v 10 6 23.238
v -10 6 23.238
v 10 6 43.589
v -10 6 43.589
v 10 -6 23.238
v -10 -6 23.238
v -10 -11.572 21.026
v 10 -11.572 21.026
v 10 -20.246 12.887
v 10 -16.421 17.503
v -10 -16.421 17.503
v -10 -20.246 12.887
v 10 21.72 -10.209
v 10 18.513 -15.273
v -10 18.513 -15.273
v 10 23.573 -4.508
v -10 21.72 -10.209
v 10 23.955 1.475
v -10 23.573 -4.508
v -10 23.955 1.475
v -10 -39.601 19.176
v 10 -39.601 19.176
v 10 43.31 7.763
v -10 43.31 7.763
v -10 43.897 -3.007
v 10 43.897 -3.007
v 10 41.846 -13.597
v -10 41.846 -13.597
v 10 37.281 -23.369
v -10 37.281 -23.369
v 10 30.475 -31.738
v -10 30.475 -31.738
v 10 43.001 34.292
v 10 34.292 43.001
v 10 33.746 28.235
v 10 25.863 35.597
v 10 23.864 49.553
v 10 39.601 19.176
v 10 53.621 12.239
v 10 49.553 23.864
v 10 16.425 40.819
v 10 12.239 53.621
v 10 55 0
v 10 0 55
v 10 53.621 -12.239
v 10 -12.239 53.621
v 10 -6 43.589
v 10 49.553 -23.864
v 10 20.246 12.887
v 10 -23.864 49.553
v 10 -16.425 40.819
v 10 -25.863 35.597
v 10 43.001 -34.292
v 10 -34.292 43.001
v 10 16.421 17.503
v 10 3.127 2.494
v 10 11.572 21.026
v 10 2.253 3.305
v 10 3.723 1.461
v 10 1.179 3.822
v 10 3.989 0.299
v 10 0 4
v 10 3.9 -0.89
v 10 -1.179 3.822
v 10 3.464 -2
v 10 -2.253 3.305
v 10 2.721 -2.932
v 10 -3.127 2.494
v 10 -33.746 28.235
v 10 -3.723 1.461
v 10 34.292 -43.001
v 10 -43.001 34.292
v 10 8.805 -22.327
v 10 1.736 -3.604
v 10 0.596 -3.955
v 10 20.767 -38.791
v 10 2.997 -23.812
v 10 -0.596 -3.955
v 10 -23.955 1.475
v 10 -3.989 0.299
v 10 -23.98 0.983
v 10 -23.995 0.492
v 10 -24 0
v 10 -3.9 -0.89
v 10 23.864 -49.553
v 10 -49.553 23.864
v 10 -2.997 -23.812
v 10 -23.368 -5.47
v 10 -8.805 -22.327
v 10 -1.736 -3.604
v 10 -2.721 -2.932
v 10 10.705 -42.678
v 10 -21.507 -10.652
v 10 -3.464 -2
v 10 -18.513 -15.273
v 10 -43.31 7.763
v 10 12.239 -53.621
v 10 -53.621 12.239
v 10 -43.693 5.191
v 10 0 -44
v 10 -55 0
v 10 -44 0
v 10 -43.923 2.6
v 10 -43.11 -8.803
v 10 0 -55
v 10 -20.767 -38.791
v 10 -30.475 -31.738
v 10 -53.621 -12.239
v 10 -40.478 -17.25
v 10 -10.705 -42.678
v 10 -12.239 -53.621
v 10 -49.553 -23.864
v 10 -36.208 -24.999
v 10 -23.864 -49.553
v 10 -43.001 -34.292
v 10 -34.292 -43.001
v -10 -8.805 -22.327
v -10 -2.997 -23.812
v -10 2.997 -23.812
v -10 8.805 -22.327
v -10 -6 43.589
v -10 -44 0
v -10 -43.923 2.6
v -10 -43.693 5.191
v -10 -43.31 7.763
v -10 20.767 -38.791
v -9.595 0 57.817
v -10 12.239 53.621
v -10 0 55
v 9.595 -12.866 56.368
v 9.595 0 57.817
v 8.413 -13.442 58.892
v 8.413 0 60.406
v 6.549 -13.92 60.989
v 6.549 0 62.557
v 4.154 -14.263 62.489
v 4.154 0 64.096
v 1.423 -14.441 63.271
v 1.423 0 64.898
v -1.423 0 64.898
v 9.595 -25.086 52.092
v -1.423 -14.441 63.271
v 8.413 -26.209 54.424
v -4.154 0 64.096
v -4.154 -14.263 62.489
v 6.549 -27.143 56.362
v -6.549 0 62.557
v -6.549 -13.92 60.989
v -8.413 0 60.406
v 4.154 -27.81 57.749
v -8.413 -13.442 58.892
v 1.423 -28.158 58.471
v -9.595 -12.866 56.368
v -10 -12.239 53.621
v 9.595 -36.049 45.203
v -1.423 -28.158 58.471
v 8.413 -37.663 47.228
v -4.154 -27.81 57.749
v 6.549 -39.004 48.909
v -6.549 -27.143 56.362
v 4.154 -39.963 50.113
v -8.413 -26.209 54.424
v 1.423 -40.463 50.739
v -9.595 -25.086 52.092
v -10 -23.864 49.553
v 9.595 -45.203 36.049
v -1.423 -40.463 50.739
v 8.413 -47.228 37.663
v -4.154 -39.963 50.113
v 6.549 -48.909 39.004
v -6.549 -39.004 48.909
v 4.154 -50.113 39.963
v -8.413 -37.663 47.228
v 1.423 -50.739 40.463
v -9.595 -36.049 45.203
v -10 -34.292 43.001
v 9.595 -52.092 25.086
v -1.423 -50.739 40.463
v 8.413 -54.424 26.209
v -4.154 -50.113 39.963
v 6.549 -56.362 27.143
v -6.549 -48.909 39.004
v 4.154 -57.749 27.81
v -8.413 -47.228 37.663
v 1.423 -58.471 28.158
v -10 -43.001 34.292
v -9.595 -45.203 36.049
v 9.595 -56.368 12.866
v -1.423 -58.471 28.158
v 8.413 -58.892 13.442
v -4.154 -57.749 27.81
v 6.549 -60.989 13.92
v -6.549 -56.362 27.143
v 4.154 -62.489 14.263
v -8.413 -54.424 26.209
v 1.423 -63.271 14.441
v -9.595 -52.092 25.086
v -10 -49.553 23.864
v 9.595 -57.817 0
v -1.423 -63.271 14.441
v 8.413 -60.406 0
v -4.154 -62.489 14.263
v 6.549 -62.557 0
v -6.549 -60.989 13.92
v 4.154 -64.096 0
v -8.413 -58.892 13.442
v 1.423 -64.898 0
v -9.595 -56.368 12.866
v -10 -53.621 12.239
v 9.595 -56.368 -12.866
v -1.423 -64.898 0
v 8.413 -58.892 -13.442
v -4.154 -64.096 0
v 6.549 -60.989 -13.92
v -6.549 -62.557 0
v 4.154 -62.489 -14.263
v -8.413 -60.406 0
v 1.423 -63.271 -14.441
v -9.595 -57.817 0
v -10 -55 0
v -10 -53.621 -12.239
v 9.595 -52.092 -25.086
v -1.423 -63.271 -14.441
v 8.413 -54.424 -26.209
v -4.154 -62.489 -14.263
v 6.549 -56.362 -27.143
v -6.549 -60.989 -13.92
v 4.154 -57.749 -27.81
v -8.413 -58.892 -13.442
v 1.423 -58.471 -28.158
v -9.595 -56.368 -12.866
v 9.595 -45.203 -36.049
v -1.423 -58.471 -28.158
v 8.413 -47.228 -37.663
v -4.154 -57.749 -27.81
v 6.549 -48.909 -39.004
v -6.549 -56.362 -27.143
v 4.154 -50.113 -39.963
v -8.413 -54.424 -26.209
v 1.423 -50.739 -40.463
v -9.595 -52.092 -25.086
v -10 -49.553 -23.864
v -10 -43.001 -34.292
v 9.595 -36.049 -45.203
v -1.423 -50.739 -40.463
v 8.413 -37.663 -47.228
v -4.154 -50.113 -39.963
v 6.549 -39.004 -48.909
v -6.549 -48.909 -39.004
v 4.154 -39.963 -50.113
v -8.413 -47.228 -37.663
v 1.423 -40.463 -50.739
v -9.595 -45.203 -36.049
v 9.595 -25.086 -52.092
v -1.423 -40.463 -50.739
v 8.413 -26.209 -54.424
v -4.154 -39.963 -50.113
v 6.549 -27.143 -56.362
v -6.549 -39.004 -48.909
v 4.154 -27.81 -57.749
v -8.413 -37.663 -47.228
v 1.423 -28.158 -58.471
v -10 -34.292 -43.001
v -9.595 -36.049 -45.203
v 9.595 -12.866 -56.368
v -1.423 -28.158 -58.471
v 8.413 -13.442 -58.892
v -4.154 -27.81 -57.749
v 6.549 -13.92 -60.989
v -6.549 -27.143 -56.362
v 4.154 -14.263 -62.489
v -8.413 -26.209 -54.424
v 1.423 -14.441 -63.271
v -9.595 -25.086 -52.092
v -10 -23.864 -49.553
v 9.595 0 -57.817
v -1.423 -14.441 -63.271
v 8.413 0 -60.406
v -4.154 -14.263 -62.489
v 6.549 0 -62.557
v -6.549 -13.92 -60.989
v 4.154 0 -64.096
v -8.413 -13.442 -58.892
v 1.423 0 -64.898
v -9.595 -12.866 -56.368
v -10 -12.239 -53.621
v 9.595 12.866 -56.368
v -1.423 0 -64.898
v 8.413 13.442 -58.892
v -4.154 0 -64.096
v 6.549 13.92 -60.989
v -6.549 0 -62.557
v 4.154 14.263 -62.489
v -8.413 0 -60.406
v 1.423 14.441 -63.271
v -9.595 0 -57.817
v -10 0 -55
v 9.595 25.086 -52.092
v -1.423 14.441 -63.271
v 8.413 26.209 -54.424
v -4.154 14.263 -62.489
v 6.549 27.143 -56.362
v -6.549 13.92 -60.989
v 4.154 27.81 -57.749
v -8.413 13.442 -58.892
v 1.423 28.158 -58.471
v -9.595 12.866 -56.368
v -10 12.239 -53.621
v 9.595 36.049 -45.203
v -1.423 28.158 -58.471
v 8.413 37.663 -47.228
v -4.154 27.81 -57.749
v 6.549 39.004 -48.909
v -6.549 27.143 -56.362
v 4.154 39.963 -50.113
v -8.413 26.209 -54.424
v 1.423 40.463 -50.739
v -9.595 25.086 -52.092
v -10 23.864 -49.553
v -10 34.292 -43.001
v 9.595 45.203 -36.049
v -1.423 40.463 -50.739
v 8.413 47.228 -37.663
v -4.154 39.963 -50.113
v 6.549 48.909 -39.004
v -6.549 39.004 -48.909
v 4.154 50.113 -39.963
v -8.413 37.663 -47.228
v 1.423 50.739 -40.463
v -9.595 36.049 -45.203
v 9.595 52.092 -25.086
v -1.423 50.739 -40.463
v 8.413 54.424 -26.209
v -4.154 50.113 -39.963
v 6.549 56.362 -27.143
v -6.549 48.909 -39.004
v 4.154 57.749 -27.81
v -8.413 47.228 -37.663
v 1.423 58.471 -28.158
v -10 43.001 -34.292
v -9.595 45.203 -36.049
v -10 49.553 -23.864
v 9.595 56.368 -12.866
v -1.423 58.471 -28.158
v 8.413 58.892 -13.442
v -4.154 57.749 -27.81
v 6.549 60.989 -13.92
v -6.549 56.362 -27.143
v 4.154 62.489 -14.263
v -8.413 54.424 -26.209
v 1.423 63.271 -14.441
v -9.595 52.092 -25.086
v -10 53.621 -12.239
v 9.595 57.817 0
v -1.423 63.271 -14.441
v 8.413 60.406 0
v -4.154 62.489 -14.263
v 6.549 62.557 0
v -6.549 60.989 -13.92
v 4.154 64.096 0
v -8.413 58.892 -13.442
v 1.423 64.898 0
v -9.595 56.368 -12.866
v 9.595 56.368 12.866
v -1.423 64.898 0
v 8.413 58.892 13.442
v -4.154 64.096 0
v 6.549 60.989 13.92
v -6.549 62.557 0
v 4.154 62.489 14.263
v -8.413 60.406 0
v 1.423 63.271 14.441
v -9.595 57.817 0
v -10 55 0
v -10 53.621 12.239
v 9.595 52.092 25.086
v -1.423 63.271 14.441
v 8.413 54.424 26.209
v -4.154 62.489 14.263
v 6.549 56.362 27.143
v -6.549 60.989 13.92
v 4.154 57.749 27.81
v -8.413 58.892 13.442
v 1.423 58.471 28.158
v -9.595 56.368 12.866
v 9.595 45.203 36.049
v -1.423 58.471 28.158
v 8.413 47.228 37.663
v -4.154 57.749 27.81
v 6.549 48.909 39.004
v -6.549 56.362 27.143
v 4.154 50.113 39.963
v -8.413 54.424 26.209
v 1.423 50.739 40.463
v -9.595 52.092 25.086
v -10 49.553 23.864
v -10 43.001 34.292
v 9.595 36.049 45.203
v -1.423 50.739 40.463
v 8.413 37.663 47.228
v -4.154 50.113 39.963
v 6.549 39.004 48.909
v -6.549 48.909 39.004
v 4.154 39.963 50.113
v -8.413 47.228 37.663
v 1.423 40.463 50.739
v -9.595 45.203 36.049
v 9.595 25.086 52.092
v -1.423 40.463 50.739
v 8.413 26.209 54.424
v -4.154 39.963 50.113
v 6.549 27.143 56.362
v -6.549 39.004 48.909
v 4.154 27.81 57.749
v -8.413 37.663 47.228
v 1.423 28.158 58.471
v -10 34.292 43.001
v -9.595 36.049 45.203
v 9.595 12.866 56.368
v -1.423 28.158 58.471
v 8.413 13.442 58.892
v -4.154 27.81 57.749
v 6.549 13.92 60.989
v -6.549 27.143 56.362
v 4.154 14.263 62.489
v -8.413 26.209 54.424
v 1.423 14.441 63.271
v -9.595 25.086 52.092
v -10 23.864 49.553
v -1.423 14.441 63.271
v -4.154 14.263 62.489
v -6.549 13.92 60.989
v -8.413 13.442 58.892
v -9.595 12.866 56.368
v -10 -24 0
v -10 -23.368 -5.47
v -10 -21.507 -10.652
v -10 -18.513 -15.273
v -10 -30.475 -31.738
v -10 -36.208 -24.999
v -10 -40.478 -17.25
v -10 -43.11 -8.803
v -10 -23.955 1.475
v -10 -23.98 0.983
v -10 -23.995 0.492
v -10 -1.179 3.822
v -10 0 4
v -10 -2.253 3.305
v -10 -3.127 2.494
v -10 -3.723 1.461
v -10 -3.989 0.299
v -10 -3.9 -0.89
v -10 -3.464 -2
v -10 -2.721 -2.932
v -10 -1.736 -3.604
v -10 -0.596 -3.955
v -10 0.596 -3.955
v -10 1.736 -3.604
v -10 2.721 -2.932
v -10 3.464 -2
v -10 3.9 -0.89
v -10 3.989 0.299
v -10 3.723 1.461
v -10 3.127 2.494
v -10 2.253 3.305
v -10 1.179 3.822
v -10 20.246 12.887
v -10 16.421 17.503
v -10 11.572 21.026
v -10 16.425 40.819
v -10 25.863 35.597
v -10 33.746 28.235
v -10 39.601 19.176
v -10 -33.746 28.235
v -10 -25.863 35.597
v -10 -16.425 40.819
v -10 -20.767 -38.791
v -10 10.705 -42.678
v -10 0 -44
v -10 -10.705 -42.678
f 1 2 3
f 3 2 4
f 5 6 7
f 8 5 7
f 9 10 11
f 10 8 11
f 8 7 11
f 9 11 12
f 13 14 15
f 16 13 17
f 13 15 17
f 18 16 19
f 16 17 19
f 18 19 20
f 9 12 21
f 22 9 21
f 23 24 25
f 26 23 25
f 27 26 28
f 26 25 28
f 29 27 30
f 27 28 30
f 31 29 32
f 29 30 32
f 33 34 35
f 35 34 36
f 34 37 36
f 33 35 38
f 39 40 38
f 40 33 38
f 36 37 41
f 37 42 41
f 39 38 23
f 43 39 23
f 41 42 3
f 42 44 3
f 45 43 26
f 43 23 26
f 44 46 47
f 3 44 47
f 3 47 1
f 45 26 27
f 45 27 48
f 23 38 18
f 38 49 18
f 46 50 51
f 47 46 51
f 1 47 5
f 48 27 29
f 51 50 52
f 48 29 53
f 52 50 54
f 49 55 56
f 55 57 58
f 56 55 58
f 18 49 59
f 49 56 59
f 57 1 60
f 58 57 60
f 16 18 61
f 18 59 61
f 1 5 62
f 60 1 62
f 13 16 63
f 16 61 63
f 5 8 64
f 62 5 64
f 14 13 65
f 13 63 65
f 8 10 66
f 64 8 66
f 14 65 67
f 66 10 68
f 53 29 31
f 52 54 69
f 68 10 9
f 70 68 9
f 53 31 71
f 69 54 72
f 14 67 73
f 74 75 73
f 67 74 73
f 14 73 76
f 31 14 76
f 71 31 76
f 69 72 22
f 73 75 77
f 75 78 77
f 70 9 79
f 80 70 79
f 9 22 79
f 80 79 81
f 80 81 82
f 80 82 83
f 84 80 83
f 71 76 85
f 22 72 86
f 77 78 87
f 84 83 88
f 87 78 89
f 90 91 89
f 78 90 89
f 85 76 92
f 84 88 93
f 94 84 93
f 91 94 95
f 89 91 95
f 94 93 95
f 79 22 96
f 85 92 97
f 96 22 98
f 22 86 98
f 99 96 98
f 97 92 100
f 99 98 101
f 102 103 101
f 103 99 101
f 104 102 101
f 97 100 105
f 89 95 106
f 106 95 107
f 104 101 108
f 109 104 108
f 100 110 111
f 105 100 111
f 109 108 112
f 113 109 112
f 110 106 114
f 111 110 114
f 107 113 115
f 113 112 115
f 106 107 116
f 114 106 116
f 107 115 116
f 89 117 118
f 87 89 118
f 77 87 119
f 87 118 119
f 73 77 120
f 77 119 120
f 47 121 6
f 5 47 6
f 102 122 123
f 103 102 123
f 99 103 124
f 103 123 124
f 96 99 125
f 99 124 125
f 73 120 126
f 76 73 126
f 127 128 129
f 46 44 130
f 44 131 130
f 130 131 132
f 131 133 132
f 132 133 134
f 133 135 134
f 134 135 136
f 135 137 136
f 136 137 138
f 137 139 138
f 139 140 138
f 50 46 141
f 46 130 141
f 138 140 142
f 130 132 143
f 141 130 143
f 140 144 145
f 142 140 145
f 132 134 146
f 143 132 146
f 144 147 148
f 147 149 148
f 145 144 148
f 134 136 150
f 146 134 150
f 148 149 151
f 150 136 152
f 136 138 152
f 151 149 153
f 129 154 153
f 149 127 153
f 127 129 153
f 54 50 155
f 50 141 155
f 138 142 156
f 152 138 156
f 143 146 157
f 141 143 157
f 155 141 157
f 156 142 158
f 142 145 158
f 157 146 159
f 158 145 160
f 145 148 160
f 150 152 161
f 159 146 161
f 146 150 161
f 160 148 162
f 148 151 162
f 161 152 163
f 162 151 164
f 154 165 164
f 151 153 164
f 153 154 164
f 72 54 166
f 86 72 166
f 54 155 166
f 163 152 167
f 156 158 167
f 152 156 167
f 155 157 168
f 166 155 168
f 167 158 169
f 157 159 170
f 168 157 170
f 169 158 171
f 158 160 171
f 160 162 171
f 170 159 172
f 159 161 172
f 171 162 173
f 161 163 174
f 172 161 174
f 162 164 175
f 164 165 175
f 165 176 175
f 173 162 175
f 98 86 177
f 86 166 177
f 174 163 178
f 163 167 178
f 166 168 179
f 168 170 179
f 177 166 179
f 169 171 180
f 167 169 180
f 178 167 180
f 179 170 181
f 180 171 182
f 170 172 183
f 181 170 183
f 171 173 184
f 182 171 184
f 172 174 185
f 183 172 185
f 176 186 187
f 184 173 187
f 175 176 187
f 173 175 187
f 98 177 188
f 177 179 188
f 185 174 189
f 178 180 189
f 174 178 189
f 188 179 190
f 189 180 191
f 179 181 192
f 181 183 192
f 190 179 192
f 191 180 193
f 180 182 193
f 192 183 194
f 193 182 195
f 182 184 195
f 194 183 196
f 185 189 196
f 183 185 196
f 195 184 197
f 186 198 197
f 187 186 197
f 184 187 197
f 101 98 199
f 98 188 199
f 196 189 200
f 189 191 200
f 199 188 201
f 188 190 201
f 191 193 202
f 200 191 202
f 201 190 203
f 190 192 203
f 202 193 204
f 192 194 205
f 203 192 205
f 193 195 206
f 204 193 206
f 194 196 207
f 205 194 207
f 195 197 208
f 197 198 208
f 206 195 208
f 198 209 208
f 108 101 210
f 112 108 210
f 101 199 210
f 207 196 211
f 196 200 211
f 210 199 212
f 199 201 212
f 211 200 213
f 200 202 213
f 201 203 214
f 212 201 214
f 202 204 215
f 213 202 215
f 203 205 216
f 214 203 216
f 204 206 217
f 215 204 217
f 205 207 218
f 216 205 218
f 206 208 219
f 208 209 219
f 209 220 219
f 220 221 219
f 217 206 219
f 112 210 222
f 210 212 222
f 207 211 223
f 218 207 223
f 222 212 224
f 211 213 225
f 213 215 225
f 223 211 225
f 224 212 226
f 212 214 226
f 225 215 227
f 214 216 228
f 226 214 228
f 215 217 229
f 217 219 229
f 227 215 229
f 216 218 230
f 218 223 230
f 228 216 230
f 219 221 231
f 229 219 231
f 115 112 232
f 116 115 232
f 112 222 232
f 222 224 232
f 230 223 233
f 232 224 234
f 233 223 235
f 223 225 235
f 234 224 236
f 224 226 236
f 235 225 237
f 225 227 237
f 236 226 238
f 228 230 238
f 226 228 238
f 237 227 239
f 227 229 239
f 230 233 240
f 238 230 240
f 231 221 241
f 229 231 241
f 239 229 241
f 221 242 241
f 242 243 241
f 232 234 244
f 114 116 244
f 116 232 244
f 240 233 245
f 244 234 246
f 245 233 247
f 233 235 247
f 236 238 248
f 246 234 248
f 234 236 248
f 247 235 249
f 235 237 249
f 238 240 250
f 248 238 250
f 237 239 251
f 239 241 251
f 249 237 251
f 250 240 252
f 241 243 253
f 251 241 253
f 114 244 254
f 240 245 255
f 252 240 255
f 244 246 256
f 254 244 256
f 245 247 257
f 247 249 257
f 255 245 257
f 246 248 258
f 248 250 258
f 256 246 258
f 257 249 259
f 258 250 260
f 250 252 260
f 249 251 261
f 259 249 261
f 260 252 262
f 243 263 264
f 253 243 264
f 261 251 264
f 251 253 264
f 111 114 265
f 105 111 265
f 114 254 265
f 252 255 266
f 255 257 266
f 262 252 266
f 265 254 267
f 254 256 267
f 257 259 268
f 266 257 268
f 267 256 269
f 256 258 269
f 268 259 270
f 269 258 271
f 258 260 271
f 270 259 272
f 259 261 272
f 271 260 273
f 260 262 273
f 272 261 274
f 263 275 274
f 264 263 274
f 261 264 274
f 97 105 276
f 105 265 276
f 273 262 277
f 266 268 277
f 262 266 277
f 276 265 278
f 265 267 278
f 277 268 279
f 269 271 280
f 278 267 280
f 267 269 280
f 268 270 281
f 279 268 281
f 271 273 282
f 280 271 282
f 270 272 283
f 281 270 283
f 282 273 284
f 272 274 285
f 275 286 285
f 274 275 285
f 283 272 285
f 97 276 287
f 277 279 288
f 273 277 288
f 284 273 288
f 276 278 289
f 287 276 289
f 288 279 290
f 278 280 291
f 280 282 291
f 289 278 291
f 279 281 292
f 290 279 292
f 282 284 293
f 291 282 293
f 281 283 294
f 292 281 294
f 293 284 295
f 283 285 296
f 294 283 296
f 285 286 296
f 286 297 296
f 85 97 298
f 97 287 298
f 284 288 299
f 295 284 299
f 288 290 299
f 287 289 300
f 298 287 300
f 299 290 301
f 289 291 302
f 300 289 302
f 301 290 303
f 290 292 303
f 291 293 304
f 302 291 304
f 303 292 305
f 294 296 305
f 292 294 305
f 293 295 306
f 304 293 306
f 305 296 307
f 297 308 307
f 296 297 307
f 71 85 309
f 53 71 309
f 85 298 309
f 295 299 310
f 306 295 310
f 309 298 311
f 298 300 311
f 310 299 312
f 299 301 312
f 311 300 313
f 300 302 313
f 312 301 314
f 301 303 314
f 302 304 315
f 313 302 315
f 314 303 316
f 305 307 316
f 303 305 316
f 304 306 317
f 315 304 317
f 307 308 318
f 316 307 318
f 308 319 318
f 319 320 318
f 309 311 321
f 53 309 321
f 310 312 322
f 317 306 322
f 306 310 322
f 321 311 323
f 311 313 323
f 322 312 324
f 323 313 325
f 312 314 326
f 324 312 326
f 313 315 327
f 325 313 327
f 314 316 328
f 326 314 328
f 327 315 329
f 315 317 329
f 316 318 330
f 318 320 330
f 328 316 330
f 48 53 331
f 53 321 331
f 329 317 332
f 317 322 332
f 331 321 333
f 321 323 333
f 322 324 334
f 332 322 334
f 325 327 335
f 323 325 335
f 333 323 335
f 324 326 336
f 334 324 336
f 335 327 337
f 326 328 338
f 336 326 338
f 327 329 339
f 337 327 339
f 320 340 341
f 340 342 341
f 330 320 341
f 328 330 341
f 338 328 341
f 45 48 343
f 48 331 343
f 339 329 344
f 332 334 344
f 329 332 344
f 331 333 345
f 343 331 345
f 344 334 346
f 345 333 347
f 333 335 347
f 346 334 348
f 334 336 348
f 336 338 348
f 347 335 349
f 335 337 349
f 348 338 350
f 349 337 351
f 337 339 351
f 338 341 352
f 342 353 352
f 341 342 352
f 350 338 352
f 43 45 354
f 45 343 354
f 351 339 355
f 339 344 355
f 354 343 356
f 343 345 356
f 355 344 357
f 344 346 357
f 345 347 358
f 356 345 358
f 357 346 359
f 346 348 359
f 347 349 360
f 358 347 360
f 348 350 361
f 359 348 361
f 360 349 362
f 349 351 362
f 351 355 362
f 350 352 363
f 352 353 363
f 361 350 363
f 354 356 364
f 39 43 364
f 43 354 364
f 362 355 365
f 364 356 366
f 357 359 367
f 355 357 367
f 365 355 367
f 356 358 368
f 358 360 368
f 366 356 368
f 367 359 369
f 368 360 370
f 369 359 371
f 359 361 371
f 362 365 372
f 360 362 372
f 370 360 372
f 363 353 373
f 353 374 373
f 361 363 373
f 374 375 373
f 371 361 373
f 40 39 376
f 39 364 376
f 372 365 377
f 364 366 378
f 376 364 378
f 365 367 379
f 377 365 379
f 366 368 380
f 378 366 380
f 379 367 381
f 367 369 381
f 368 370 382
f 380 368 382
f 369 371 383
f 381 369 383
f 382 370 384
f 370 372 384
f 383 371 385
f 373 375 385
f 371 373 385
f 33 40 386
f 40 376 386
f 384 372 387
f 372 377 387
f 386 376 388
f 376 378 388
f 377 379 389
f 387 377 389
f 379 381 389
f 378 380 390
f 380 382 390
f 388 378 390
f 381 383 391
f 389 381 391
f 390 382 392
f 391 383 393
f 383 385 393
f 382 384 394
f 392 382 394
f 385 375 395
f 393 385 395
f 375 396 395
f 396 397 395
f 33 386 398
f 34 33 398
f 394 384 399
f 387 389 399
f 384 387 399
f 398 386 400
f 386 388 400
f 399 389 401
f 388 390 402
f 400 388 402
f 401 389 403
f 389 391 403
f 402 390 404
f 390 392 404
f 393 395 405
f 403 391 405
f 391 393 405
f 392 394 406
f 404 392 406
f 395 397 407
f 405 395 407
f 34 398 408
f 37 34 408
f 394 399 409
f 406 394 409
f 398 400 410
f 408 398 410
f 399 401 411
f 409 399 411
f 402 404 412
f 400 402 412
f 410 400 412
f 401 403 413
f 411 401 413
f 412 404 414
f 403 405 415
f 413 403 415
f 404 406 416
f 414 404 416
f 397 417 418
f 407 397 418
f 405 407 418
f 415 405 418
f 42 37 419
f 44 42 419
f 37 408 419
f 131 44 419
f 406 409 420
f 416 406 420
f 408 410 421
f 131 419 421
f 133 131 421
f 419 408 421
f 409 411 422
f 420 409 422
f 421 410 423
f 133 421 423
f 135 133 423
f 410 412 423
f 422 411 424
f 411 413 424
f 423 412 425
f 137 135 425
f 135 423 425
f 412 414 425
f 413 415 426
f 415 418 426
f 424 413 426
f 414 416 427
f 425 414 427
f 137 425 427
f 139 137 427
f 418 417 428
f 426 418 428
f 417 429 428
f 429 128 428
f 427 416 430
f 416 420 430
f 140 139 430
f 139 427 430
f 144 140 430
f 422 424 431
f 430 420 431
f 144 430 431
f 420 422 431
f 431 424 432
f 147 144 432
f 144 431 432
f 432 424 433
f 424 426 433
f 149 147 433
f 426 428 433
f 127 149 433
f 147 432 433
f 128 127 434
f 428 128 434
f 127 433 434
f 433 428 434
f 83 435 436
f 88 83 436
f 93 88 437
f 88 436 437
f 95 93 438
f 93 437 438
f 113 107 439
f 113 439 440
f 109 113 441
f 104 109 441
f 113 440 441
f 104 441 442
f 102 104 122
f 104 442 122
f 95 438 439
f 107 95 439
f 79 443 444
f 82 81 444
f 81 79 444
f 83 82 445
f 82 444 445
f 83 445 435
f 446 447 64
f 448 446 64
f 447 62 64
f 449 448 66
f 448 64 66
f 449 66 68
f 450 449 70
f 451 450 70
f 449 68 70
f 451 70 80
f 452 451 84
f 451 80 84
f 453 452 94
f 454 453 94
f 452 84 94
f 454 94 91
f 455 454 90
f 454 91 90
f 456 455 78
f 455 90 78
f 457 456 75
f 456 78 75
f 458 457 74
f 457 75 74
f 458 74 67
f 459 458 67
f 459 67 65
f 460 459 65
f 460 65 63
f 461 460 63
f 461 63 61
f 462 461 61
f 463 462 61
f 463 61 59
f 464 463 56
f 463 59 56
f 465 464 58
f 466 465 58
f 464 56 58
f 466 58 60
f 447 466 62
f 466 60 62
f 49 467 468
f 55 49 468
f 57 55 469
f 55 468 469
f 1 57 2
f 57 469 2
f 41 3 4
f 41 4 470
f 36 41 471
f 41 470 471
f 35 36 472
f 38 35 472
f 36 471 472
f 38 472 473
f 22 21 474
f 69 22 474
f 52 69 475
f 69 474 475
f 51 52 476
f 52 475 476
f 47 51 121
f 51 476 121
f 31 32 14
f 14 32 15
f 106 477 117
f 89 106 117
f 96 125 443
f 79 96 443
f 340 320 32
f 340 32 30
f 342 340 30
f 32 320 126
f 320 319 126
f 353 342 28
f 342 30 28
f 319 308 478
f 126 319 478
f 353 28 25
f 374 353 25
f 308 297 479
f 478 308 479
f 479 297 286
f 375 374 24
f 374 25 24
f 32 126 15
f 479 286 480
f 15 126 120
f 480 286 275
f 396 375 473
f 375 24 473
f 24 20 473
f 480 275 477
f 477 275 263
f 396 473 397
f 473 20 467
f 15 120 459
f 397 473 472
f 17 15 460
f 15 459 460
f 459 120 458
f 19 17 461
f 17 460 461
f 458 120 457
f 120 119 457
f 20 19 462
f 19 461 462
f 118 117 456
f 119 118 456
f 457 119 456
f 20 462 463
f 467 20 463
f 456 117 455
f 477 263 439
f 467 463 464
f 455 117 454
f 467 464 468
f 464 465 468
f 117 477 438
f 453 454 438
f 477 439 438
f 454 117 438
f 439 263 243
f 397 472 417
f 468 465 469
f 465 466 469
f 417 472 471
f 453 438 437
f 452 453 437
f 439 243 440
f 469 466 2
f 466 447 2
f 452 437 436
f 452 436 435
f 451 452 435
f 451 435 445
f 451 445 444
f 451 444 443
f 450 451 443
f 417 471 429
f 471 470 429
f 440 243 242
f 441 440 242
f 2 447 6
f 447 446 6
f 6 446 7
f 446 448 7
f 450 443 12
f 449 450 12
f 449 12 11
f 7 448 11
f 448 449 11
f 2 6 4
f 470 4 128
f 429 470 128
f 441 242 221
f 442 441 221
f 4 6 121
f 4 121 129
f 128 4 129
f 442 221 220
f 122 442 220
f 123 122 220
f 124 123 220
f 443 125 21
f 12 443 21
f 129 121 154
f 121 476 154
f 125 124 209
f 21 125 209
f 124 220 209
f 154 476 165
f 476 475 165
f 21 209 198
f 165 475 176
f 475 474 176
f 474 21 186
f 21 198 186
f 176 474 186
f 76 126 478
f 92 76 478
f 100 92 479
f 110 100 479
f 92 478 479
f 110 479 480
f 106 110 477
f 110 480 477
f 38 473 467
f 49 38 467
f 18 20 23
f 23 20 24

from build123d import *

# Parameters (mm, degrees)
F3_DEPTH = 25


with BuildPart() as f1:
    # F0 (on Front) → F1 (revolve)
    with BuildSketch(Plane.XZ):
        with BuildLine():
            Line((-10, 55), (-10, 4))
            Line((-10, 4), (10, 4))
            Line((10, 4), (10, 55))
            ThreePointArc((10, 55), (0, 45), (-10, 55))
        make_face()
        with BuildLine():
            ThreePointArc((10, 55), (0, 65), (-10, 55))
            ThreePointArc((-10, 55), (0, 45), (10, 55))
        make_face()
    revolve(axis=Axis((-12.7272796474, 0, 0), (1, 0, 0)))

    # F2 (on face) → F3 (cut)
    with BuildSketch(Plane(origin=(-10, 0, 0), x_dir=(0, -1, 0), z_dir=(-1, 0, 0))):
        with BuildLine():
            Line((-30.4750671187, -31.7375217071), (-18.5129969259, -15.2731445623))
            ThreePointArc((-18.5129969259, -15.2731445623), (-22.8253563911, -7.416407865), (-23.9546582597, 1.4745669397))
            Line((-23.9546582597, 1.4745669397), (-43.3096944075, 7.7633994054))
            ThreePointArc((-43.3096944075, 7.7633994054), (-41.846486717, -13.5967477525), (-30.4750671187, -31.7375217071))
        make_face()
        with BuildLine():
            Line((20.7668631862, -38.7909447346), (8.8047929934, -22.3265675898))
            ThreePointArc((8.8047929934, -22.3265675898), (0, -24), (-8.8047929934, -22.3265675898))
            Line((-8.8047929934, -22.3265675898), (-20.7668631862, -38.7909447346))
            ThreePointArc((-20.7668631862, -38.7909447346), (0, -44), (20.7668631862, -38.7909447346))
        make_face()
        with BuildLine():
            ThreePointArc((23.9546582597, 1.4745669397), (23.9886618867, 0.7376319429), (24, 0))
            ThreePointArc((24, 0), (22.5866323986, -8.1144338613), (18.5129969259, -15.2731445623))
            Line((18.5129969259, -15.2731445623), (30.4750671187, -31.7375217071))
            ThreePointArc((30.4750671187, -31.7375217071), (40.4777899176, -17.2495948761), (44, 0))
            ThreePointArc((44, 0), (43.8270838291, 3.8970146311), (43.3096944075, 7.7633994054))
            Line((43.3096944075, 7.7633994054), (23.9546582597, 1.4745669397))
        make_face()
        with BuildLine():
            ThreePointArc((-20.2464543272, 12.8872451352), (-14.106846055, 19.416407865), (-6, 23.2379000772))
            Line((-6, 23.2379000772), (-6, 43.5889894354))
            ThreePointArc((-6, 43.5889894354), (-25.8625511009, 35.5967477525), (-39.601490475, 19.1760776009))
            Line((-39.601490475, 19.1760776009), (-20.2464543272, 12.8872451352))
        make_face()
        with BuildLine():
            ThreePointArc((6, 23.2379000772), (14.106846055, 19.416407865), (20.2464543272, 12.8872451352))
            Line((20.2464543272, 12.8872451352), (39.601490475, 19.1760776009))
            ThreePointArc((39.601490475, 19.1760776009), (25.8625511009, 35.5967477525), (6, 43.5889894354))
            Line((6, 43.5889894354), (6, 23.2379000772))
        make_face()
    extrude(amount=-F3_DEPTH, mode=Mode.SUBTRACT)


solid = f1.part
